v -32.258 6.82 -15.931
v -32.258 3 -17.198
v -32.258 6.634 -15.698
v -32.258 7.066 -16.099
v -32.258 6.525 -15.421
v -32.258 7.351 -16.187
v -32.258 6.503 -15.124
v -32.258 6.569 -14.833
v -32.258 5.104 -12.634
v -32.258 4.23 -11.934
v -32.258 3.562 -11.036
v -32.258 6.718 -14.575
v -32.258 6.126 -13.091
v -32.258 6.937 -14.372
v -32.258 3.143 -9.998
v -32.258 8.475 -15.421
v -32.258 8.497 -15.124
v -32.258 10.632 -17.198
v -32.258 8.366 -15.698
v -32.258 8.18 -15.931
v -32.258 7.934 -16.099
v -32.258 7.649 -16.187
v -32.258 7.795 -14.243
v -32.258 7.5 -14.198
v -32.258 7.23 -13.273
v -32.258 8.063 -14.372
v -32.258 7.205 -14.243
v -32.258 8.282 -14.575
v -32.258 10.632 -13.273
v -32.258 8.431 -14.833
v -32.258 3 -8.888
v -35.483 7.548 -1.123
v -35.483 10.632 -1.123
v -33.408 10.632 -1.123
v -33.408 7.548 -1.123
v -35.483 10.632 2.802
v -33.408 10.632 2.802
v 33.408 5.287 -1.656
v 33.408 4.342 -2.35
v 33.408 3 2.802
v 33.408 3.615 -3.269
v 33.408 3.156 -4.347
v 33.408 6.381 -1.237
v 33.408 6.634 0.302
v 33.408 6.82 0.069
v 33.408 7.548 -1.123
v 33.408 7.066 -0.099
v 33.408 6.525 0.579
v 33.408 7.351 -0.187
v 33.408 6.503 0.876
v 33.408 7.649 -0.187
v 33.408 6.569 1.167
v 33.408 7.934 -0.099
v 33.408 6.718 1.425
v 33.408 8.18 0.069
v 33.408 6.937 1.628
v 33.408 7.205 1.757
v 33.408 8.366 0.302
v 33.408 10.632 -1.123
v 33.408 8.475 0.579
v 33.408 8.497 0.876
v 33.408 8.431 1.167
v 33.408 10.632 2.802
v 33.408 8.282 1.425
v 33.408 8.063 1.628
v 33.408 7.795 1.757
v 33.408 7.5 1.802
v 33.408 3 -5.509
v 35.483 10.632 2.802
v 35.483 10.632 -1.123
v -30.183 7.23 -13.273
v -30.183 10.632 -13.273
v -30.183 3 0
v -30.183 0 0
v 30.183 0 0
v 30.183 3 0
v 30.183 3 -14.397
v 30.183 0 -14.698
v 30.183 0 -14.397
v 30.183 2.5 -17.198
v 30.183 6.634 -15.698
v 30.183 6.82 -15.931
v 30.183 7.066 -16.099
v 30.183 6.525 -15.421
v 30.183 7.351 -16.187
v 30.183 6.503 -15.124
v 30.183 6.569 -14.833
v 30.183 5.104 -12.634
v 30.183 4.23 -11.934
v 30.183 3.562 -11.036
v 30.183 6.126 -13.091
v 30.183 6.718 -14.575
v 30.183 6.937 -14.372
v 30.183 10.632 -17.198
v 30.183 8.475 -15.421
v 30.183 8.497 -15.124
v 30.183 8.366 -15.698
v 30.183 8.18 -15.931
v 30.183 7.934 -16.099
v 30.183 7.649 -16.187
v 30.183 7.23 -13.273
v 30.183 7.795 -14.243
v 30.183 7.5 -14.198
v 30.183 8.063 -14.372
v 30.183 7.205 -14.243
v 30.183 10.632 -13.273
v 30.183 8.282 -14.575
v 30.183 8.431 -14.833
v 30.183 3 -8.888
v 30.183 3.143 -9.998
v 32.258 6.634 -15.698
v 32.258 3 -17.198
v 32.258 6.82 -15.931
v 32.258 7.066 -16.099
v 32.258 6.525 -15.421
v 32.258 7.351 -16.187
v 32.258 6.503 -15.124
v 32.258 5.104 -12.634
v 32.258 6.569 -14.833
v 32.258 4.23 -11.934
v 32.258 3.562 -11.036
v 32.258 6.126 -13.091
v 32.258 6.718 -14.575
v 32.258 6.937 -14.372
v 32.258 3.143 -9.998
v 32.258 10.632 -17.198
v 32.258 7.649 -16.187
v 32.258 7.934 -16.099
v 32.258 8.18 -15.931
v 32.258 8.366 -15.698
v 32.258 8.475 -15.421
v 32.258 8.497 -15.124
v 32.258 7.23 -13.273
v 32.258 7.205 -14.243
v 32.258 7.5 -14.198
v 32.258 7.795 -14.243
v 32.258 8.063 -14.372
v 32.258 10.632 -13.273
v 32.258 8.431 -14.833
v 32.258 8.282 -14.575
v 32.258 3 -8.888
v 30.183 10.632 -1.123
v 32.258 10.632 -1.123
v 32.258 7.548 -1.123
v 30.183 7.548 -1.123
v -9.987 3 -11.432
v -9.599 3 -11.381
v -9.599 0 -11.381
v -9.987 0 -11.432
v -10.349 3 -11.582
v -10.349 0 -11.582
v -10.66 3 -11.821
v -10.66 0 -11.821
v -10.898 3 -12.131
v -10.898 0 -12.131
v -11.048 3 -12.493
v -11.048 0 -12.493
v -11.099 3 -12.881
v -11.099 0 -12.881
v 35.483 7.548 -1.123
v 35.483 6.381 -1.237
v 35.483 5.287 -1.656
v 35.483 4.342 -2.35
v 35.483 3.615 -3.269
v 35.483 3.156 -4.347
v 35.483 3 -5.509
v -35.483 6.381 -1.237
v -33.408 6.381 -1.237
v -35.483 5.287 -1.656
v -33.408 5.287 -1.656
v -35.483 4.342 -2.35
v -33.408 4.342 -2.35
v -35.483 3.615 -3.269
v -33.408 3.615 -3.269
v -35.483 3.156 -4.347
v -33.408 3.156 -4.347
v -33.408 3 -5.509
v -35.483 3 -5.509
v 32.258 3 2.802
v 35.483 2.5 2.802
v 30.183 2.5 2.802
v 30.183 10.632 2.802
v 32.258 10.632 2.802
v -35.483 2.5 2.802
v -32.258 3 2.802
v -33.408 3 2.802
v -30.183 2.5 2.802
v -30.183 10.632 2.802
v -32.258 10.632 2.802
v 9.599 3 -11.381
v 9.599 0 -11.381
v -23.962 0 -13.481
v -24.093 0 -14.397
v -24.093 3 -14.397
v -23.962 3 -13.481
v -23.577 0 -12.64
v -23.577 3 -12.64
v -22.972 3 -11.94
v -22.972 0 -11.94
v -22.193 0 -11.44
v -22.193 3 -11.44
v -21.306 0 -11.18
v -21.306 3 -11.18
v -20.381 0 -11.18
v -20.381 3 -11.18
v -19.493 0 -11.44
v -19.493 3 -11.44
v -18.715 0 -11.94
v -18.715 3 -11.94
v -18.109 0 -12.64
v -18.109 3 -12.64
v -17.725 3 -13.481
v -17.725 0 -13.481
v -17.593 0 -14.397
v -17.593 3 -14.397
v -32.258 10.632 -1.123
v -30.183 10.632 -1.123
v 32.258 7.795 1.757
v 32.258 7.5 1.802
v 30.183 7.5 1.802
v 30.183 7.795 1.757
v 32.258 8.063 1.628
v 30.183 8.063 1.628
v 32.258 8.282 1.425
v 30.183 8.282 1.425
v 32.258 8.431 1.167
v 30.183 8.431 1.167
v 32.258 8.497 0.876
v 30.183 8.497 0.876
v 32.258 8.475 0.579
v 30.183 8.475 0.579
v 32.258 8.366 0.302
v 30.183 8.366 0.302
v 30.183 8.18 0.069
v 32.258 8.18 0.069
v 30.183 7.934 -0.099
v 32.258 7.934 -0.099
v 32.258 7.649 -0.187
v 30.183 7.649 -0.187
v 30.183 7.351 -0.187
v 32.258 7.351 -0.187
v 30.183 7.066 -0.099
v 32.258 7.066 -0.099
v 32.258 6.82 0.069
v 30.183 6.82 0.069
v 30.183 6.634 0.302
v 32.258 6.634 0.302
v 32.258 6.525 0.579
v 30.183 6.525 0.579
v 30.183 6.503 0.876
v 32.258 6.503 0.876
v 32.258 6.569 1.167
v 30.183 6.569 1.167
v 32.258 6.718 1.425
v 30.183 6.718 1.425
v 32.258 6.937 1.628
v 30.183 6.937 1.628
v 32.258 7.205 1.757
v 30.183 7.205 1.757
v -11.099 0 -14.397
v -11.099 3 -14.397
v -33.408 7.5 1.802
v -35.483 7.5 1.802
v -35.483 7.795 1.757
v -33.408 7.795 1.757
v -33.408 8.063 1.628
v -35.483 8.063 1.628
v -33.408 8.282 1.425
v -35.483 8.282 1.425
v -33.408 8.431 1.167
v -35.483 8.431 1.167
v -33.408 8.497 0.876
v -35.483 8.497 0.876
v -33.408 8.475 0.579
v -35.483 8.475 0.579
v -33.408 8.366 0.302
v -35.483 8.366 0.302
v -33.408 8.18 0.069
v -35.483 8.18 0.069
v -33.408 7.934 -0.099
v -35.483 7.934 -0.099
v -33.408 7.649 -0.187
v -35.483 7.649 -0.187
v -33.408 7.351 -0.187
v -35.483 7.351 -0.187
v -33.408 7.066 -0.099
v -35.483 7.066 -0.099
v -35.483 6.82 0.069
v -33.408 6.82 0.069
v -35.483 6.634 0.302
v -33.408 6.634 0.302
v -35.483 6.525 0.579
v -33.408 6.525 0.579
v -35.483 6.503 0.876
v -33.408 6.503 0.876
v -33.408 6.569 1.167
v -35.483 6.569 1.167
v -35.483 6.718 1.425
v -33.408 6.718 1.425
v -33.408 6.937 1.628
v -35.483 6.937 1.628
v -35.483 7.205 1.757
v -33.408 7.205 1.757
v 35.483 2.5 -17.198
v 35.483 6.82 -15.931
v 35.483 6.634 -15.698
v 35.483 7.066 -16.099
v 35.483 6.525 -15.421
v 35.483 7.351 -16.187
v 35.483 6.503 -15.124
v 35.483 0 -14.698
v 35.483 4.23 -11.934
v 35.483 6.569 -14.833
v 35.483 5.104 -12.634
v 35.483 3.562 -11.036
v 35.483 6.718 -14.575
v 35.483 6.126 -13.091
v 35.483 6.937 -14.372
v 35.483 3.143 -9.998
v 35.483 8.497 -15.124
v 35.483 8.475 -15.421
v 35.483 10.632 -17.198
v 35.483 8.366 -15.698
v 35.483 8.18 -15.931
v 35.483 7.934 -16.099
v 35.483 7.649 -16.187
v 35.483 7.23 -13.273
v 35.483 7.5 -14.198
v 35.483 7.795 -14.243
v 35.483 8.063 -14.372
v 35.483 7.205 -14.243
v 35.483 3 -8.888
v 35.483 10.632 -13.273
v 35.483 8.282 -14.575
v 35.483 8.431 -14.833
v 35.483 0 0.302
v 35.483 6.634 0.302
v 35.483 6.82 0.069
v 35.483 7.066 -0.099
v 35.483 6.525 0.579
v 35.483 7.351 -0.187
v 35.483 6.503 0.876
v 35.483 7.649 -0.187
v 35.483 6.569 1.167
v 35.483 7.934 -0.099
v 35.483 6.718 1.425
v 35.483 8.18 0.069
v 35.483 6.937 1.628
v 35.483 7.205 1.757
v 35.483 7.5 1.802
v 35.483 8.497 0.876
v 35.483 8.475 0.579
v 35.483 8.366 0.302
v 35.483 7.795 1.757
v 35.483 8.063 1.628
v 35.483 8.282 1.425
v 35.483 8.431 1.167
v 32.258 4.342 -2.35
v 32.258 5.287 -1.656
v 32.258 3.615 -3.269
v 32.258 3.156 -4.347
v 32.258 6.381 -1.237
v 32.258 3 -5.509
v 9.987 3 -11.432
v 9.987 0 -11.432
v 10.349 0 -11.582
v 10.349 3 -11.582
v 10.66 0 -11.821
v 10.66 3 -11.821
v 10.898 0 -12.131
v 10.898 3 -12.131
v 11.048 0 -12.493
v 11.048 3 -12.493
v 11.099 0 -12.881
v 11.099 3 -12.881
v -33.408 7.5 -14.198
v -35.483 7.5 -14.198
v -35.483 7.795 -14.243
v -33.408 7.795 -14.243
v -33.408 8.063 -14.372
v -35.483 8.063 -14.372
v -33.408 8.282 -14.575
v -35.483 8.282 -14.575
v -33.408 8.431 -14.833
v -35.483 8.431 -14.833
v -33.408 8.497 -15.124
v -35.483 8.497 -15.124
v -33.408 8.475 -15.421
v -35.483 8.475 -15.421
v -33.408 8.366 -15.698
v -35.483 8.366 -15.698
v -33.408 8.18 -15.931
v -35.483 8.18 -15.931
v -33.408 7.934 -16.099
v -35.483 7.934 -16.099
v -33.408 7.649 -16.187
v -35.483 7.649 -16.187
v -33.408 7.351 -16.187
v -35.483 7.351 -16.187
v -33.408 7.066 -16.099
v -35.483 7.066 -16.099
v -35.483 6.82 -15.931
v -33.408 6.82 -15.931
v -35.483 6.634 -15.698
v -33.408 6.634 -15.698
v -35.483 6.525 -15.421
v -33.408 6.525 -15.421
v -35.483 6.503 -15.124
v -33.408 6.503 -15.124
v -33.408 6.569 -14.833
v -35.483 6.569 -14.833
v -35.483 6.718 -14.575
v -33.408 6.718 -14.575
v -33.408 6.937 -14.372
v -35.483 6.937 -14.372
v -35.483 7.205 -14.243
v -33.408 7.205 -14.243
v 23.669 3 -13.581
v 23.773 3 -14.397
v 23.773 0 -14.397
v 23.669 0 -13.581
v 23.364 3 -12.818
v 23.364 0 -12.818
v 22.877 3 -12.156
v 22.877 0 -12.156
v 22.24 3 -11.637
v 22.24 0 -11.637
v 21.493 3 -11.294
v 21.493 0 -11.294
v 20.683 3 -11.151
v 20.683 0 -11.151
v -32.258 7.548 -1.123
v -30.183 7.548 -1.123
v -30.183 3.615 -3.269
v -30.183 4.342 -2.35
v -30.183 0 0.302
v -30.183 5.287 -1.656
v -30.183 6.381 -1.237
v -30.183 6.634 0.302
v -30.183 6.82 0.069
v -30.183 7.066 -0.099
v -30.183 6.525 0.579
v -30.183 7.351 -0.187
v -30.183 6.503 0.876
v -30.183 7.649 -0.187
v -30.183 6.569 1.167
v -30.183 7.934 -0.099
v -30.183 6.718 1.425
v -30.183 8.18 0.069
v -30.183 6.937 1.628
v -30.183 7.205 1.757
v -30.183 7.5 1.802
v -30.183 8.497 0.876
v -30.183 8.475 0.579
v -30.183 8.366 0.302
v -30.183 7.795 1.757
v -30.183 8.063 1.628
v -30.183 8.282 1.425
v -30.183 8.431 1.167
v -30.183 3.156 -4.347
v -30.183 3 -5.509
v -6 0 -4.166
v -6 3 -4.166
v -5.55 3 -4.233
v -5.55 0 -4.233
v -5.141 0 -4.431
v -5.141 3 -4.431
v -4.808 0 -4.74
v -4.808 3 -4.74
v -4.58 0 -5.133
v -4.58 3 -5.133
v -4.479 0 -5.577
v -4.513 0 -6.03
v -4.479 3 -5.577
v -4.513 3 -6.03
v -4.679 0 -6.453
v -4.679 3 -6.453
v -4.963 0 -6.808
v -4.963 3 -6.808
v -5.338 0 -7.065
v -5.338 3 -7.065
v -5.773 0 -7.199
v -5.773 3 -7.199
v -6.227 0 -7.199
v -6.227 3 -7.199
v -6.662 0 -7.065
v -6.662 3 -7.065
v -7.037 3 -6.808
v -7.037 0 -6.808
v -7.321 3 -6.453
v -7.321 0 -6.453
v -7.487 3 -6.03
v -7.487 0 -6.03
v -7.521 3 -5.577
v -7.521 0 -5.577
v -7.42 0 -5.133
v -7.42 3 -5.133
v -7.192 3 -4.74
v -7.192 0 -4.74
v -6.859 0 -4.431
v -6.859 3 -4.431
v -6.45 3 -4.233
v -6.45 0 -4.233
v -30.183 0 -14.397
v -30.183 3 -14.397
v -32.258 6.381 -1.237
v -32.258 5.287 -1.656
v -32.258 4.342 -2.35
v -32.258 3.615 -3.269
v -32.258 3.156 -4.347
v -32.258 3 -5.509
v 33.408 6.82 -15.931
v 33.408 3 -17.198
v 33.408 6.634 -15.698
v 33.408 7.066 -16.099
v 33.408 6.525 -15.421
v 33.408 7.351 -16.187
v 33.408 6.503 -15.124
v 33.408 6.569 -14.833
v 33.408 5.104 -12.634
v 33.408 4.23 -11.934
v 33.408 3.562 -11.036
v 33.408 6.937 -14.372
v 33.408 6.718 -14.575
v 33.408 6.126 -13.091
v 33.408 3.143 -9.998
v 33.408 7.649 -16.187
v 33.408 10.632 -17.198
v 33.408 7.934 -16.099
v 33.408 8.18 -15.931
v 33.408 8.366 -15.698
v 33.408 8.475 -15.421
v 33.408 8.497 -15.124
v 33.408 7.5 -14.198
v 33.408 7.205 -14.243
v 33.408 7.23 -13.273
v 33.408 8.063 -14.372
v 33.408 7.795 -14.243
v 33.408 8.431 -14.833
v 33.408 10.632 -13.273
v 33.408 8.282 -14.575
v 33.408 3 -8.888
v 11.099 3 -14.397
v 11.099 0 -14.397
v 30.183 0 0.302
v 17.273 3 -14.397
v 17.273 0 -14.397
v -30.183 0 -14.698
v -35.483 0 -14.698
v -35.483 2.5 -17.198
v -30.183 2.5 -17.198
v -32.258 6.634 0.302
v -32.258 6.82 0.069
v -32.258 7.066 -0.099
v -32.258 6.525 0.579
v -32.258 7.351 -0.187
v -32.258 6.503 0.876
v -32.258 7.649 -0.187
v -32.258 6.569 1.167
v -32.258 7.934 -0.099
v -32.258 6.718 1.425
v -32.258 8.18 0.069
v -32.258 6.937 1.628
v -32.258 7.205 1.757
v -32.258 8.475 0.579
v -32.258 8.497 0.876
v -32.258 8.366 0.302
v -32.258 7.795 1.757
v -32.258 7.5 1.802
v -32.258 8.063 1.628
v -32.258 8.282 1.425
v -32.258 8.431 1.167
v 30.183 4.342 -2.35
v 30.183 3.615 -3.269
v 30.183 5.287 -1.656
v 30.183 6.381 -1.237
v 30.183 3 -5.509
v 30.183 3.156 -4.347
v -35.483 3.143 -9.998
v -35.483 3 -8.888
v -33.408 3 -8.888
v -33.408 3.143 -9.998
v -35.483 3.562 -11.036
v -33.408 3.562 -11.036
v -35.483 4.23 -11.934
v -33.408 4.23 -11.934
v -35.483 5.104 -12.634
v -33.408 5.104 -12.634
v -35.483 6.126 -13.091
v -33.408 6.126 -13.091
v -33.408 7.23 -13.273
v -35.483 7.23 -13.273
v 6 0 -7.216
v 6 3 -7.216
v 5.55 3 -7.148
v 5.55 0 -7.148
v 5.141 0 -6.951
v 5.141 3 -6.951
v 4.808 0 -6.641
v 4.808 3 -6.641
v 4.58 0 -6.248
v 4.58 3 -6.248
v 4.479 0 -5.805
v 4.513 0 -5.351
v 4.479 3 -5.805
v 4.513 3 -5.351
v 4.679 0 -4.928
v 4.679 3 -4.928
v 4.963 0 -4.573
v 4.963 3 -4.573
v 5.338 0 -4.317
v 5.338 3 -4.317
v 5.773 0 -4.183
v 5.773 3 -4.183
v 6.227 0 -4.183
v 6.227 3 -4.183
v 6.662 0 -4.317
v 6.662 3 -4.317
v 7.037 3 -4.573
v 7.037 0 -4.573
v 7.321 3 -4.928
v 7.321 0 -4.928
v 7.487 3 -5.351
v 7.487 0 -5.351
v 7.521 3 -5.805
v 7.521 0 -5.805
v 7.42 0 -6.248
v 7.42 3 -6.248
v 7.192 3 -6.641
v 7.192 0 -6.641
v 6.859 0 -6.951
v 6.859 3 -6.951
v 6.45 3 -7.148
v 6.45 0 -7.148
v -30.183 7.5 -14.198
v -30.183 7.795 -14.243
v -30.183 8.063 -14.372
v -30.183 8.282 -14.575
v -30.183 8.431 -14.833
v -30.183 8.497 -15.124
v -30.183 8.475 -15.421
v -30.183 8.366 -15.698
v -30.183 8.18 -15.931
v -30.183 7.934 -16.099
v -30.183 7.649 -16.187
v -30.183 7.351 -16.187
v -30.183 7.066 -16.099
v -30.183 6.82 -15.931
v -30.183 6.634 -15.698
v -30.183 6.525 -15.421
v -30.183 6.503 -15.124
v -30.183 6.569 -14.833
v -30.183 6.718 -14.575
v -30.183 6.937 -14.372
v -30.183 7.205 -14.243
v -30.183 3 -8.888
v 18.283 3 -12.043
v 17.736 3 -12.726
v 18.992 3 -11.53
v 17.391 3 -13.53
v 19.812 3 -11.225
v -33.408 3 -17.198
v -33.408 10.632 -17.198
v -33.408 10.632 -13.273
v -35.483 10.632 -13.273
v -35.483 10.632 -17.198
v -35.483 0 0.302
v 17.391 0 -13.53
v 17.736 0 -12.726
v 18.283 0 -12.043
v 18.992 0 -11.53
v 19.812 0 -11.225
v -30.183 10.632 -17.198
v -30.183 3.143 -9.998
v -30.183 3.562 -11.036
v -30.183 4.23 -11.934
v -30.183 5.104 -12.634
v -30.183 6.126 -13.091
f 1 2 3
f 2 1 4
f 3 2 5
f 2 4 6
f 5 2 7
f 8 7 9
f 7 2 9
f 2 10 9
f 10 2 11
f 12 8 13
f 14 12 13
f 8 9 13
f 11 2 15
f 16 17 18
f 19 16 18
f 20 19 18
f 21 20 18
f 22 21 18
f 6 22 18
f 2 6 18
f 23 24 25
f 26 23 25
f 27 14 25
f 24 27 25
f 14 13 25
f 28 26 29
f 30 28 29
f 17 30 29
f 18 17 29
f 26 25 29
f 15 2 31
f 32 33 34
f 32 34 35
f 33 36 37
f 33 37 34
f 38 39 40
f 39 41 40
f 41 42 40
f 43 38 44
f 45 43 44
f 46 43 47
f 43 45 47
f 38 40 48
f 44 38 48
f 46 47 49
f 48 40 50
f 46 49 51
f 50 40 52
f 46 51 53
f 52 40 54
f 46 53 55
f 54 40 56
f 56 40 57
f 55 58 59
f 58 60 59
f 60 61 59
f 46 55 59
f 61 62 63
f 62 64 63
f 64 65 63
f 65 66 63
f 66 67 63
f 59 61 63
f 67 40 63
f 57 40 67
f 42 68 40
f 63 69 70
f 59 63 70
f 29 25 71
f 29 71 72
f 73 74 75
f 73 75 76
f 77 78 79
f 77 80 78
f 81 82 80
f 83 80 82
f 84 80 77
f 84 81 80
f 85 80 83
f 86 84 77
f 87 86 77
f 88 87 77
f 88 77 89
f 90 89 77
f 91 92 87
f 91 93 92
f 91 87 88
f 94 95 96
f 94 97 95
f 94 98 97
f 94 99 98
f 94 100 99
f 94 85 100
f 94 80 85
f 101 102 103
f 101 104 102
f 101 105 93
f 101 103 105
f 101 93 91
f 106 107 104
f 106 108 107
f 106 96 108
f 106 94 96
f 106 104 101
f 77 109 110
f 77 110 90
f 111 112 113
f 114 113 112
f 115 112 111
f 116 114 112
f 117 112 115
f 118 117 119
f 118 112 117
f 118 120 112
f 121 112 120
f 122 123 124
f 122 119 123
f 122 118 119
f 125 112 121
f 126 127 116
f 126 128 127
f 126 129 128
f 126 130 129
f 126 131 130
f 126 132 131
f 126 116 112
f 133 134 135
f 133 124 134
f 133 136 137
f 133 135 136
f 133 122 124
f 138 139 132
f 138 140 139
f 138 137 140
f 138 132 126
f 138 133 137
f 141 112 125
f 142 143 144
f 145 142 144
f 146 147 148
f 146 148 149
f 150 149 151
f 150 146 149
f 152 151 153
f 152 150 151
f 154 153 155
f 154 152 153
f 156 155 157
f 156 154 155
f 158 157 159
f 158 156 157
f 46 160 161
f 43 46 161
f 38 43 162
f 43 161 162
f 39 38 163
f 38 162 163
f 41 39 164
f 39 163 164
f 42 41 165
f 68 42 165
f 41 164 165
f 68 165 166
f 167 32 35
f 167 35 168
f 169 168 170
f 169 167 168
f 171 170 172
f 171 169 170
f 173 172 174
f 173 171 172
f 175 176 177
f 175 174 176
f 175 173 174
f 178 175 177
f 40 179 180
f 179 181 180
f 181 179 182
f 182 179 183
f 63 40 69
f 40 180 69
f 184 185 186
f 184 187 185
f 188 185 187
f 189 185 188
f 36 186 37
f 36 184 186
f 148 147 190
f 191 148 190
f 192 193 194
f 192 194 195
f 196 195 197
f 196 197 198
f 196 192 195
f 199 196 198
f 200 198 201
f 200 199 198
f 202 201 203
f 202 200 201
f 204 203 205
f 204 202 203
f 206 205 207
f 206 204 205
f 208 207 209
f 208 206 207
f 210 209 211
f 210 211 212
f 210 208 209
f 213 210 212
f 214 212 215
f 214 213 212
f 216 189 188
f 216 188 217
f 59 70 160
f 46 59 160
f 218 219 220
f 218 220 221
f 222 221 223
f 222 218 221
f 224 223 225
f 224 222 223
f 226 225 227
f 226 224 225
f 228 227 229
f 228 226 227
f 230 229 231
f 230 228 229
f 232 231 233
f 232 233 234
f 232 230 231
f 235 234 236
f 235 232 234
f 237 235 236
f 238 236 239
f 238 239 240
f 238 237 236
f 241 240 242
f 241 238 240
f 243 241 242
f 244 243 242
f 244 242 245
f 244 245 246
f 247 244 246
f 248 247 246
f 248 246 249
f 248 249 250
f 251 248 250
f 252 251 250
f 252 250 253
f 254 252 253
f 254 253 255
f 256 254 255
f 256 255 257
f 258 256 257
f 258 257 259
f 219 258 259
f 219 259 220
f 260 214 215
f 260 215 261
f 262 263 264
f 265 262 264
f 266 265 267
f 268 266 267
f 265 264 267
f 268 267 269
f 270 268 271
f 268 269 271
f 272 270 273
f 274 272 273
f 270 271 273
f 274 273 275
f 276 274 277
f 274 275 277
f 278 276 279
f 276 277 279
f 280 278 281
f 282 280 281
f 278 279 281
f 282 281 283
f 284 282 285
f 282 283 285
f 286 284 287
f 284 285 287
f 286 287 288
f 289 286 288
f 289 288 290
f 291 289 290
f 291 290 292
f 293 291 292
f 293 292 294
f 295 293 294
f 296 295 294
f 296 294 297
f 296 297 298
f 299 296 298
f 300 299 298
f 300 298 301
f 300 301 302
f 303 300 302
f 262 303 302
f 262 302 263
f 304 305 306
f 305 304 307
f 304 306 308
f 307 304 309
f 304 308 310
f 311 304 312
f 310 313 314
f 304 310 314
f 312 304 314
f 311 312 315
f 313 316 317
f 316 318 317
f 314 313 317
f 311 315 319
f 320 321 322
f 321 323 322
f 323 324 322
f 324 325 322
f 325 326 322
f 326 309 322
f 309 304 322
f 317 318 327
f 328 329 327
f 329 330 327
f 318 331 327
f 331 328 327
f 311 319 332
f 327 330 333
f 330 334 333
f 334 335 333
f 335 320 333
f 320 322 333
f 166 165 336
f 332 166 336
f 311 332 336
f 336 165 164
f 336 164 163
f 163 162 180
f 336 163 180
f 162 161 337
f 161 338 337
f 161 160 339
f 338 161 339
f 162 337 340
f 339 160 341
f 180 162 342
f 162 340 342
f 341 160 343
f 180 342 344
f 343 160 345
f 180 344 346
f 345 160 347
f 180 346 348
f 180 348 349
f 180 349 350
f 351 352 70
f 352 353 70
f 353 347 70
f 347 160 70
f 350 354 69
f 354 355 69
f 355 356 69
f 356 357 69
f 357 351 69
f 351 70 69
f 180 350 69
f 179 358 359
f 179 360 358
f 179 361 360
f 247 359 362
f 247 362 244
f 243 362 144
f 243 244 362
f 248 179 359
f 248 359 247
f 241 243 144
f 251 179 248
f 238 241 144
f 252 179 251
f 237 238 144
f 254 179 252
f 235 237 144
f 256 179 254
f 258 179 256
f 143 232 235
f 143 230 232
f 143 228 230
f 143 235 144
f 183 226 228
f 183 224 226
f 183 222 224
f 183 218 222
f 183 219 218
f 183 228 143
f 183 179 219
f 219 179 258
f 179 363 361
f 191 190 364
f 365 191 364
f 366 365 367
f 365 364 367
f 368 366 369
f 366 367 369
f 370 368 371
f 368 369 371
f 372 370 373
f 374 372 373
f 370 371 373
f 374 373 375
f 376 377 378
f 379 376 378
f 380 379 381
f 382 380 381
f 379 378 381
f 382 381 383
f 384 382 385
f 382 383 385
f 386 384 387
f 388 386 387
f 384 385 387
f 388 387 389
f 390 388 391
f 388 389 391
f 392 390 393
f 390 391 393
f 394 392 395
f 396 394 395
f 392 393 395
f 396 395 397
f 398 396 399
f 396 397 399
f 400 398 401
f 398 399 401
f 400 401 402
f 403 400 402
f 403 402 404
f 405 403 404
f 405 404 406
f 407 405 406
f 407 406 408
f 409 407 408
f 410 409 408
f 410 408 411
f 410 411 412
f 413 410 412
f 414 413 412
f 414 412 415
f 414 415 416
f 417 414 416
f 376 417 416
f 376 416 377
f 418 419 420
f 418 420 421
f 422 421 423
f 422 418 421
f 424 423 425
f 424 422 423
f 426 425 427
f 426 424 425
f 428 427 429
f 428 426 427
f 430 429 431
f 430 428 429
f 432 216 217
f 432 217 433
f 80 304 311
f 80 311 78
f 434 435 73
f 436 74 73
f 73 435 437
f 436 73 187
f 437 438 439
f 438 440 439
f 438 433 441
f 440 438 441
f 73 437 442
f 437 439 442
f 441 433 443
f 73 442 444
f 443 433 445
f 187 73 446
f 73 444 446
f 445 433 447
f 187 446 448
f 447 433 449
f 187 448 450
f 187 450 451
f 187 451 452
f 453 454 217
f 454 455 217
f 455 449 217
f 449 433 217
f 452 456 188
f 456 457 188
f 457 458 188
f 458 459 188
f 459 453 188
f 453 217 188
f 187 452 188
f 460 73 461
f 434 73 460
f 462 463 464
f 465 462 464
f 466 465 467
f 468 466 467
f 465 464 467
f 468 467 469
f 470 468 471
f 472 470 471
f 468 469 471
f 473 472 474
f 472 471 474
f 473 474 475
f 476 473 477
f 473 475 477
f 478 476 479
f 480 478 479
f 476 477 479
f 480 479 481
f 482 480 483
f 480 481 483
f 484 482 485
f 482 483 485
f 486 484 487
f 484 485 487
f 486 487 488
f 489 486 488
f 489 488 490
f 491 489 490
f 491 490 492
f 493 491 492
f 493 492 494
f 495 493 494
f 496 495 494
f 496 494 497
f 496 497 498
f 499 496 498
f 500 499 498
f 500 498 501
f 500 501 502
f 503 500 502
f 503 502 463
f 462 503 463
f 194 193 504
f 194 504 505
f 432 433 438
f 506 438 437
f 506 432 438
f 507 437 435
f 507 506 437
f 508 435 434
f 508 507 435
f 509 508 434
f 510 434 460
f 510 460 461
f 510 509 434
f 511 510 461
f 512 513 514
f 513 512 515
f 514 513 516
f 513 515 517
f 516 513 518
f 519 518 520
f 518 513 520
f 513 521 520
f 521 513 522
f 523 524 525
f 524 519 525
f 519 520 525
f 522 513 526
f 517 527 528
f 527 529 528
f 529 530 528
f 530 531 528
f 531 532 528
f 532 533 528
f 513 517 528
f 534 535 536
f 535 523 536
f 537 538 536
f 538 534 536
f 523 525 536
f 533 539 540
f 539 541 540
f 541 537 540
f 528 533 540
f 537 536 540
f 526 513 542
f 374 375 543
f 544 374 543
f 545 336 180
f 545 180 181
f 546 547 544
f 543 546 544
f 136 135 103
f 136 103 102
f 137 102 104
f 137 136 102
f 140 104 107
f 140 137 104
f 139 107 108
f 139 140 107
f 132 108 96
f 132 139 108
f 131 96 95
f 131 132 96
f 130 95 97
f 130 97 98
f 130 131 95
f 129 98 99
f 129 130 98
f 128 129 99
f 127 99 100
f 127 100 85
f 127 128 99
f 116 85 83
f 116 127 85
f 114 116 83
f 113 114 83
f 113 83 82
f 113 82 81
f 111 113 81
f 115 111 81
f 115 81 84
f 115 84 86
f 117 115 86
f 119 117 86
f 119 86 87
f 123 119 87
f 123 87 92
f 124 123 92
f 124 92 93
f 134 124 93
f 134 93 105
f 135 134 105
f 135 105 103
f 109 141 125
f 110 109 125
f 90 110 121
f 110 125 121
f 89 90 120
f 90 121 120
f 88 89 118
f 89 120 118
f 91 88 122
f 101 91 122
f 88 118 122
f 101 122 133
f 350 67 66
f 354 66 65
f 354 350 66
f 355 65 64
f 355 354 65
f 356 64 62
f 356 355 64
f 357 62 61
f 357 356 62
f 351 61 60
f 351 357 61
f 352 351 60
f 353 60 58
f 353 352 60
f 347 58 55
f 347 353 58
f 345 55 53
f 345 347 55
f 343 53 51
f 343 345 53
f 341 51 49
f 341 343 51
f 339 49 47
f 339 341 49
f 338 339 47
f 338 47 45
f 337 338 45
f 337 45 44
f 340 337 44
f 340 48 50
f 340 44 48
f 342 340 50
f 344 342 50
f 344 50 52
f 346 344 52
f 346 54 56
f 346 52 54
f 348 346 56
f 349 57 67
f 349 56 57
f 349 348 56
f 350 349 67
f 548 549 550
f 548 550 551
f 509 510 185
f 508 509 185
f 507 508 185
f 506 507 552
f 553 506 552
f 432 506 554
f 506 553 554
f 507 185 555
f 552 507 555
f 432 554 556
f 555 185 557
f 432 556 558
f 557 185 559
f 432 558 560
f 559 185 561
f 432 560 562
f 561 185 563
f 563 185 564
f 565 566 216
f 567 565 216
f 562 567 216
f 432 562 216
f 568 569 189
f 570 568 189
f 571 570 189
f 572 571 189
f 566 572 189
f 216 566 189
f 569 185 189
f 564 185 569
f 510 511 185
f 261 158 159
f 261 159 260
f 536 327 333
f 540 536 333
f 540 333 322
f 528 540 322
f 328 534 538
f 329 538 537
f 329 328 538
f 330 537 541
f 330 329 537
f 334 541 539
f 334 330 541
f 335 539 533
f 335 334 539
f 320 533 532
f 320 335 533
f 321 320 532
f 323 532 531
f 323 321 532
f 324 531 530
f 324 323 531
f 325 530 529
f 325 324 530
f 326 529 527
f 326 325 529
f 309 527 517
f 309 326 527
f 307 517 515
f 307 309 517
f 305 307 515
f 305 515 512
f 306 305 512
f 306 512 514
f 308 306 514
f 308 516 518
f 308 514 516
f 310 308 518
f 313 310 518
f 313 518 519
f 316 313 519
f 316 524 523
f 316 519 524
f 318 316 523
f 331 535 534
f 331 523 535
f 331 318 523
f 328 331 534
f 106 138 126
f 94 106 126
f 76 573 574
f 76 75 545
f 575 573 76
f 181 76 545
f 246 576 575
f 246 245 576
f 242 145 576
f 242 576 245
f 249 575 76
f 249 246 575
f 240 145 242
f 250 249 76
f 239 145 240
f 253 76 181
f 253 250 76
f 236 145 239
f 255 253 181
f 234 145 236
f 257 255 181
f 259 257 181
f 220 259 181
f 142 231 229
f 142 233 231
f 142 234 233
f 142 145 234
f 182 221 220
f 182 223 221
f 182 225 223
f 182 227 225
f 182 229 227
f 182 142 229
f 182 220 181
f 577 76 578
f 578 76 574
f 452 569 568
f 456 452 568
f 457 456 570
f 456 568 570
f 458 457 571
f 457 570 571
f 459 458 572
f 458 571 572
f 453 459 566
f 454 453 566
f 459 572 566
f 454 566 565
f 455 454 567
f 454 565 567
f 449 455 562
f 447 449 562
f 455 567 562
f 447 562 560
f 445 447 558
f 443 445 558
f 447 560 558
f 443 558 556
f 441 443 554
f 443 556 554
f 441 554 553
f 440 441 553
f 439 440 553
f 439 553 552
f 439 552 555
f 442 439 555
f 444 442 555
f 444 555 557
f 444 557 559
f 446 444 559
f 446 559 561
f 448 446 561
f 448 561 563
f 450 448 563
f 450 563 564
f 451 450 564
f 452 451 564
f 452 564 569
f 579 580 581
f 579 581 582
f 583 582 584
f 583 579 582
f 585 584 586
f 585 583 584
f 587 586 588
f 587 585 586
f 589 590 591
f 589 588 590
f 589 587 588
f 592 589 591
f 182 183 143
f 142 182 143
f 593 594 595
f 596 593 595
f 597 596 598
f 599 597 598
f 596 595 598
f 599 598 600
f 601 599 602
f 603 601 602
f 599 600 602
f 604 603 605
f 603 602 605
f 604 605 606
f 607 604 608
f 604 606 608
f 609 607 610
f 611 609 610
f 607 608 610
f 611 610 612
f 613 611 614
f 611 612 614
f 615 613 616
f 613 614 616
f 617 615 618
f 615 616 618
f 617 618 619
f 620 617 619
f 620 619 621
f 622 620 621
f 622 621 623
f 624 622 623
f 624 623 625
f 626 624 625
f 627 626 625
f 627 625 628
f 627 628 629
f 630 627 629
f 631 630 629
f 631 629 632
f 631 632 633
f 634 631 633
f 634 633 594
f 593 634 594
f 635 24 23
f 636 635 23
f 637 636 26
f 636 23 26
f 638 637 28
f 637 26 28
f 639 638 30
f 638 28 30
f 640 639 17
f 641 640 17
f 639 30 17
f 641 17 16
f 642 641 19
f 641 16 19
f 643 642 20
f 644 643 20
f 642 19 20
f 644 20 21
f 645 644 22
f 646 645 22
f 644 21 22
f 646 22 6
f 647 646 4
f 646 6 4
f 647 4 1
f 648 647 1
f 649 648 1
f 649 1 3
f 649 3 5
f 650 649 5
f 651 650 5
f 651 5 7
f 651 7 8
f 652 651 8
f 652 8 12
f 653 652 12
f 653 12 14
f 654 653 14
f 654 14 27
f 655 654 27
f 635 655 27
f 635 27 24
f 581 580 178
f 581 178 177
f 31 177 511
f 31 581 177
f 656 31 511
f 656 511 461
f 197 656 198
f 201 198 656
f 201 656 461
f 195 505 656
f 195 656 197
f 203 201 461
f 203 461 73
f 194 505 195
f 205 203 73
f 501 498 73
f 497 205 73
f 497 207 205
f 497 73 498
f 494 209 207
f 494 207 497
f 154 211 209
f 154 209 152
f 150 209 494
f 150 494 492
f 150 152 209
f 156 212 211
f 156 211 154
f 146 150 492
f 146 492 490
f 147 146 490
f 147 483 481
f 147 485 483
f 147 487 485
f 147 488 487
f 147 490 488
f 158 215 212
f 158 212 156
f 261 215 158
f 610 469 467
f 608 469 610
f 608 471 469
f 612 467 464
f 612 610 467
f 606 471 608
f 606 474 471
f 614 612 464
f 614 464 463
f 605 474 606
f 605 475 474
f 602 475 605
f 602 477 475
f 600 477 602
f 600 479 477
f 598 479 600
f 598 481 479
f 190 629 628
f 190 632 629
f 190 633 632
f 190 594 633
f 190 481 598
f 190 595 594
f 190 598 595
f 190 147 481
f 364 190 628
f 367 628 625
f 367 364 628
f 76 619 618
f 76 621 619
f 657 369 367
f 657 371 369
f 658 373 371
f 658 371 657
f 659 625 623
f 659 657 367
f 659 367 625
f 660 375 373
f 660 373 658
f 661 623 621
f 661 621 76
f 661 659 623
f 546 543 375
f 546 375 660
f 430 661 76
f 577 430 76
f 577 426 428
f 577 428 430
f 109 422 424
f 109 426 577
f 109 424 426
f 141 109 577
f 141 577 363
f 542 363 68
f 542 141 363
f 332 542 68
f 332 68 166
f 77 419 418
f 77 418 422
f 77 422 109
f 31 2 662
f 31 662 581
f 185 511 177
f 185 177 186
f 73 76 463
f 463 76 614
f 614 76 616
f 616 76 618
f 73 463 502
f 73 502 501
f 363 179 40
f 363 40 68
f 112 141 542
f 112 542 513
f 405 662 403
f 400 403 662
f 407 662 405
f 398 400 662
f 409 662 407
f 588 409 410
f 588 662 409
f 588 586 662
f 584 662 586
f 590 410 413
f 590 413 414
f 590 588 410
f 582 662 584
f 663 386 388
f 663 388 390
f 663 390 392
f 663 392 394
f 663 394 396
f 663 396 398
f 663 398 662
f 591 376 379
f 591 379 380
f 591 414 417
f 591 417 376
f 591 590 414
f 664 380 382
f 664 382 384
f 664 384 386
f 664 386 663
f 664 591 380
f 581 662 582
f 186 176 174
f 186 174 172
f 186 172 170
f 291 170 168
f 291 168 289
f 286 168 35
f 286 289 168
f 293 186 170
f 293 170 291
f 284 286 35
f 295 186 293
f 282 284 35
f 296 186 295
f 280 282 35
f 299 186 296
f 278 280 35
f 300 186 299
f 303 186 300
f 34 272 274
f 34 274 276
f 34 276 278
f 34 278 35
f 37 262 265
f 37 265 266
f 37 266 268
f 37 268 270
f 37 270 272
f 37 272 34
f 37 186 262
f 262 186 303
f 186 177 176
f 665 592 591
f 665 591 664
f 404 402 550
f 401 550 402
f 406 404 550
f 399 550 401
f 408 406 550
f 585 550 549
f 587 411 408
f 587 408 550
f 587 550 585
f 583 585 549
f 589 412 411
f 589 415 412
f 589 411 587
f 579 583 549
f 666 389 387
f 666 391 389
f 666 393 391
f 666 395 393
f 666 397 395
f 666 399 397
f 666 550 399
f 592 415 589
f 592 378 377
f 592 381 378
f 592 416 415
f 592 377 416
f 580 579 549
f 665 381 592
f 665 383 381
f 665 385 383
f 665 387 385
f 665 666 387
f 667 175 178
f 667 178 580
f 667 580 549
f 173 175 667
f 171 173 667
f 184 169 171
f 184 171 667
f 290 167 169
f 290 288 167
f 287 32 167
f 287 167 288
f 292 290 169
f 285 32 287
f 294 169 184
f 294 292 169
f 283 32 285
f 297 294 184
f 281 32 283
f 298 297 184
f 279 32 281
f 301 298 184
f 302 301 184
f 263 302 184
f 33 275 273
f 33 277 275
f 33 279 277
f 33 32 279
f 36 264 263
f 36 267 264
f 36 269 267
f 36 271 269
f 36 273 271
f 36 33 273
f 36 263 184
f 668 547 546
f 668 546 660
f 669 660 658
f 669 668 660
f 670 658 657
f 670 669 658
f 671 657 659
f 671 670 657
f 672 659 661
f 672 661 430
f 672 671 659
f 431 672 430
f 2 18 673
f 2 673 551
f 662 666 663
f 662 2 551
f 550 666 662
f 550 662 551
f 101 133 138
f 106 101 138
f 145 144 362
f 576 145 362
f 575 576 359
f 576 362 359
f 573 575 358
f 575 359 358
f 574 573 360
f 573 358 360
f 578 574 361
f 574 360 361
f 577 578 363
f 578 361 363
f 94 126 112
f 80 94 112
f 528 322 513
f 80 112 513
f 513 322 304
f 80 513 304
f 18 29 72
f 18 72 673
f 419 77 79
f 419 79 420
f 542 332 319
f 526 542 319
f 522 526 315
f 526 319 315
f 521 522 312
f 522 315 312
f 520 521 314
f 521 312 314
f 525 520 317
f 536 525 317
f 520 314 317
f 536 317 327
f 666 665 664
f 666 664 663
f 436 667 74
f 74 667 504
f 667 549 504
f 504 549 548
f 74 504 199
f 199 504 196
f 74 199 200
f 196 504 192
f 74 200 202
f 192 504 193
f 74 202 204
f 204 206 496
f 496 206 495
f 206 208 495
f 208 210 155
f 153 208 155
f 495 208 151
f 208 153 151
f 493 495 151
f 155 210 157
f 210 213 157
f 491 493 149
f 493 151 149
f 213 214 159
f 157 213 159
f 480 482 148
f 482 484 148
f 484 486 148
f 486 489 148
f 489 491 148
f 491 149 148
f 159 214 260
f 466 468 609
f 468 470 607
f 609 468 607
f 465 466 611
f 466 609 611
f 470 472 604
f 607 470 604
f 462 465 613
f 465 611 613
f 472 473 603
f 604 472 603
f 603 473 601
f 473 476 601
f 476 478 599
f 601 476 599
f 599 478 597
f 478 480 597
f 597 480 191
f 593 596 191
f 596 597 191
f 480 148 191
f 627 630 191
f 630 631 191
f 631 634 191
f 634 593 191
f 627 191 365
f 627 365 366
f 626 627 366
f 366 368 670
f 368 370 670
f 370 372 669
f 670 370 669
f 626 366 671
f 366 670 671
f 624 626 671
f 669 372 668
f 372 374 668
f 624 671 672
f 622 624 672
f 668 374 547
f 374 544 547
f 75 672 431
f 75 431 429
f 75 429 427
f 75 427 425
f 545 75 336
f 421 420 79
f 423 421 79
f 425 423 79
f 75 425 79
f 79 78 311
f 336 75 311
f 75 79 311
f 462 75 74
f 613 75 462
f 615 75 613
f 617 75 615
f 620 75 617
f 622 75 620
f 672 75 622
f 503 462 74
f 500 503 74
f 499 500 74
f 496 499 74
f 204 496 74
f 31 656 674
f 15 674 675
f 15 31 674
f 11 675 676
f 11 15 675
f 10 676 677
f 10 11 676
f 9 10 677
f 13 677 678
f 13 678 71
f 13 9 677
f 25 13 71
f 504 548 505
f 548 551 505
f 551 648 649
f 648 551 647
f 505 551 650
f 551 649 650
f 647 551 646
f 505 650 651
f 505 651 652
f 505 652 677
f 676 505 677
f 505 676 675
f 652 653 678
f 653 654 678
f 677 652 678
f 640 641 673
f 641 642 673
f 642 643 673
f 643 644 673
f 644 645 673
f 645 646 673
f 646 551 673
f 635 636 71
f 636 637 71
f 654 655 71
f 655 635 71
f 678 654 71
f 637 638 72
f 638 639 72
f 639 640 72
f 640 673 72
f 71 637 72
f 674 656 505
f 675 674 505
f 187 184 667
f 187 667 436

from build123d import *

# Parameters (mm, degrees)
BOSS_EXTRUDE1_DEPTH      = 3
SKETCH2_W                = 14.396583112
SKETCH2_H                = 3
BOSS_EXTRUDE2_DEPTH      = 8.6
SKETCH3_R                = 1
BOSS_EXTRUDE3_DEPTH      = 5.3
SKETCH4_W                = 1.15
SKETCH4_H                = 7.632118098
CUT_EXTRUDE1_DEPTH       = 26.3
CHAMFER1_SIZE            = 2.5
CUT_EXTRUDE2_DEPTH       = 10
CHAMFER1_OF_MIRROR1_SIZE = 2.5
CUT_EXTRUDE5_START       = -10
CUT_EXTRUDE5_DEPTH       = 10
BOSS_EXTRUDE4_DEPTH      = 3
SKETCH7_R                = 1.525
CUT_EXTRUDE6_DEPTH       = 41.163420863


with BuildPart() as part:
    # Sketch1 → Boss-Extrude1 (new body)
    with BuildSketch(Plane(origin=(0, 0, 0), x_dir=(1, 0, 0), z_dir=(0, 1, 0))):
        with BuildLine():
            Line((-26.88337521, 0), (-26.88337521, 14.396583112))
            Line((-26.88337521, 14.396583112), (-24.09337521, 14.396583112))
            ThreePointArc((-24.09337521, 14.396583112), (-20.84337521, 11.146583112), (-17.59337521, 14.396583112))
            Line((-17.59337521, 14.396583112), (0, 14.396583112))
            Line((0, 14.396583112), (0, 0))
            Line((0, 0), (-26.88337521, 0))
        make_face()
    boss_extrude1 = extrude(amount=BOSS_EXTRUDE1_DEPTH)

    # Sketch2 → Boss-Extrude2 (add)
    with BuildSketch(Plane.ZY.offset(26.88337521)):
        with Locations((-7.198291556, 1.5)):
            Rectangle(SKETCH2_W, SKETCH2_H)
    boss_extrude2 = extrude(amount=BOSS_EXTRUDE2_DEPTH)

    # Sketch3 → Boss-Extrude3 (add)
    with BuildSketch(Plane.ZY.offset(35.48337521)):
        with BuildLine():
            Line((1.532781983, 10.632118098), (-1.123291556, 10.632118098))
            Line((-1.123291556, 10.632118098), (-1.123291556, 10.557118098))
            Line((-1.123291556, 10.557118098), (-1.123291556, 7.547815402))
            ThreePointArc((-1.123291556, 7.547815402), (-2.349871735, 4.342215517), (-5.508799885, 3))
            Line((-5.508799885, 3), (-8.887750376, 3))
            ThreePointArc((-8.887750376, 3), (-11.934395079, 4.229921298), (-13.273291556, 7.230272374))
            Line((-13.273291556, 7.230272374), (-13.273291556, 10.557118098))
            Line((-13.273291556, 10.557118098), (-13.273291556, 10.632118098))
            Line((-13.273291556, 10.632118098), (-15.929365096, 10.632118098))
            Line((-15.929365096, 10.632118098), (-17.198291556, 10.632118098))
            Line((-17.198291556, 10.632118098), (-17.198291556, 7.5))
            Line((-17.198291556, 7.5), (-17.198291556, 0))
            Line((-17.198291556, 0), (-14.396583112, 0))
            Line((-14.396583112, 0), (0, 0))
            Line((0, 0), (2.801708444, 0))
            Line((2.801708444, 0), (2.801708444, 7.5))
            Line((2.801708444, 7.5), (2.801708444, 10.632118098))
            Line((2.801708444, 10.632118098), (1.532781983, 10.632118098))
        make_face()
        with Locations((-15.198291556, 7.5)):
            Circle(SKETCH3_R, mode=Mode.SUBTRACT)
        with Locations((0.801708444, 7.5)):
            Circle(SKETCH3_R, mode=Mode.SUBTRACT)
    boss_extrude3 = extrude(amount=-BOSS_EXTRUDE3_DEPTH)

    # Sketch4 → Cut-Extrude1 (cut)
    with BuildSketch(Plane.XY.offset(2.801708444)):
        with Locations((-32.83337521, 6.816059049)):
            Rectangle(SKETCH4_W, SKETCH4_H)
    cut_extrude1 = extrude(amount=-CUT_EXTRUDE1_DEPTH, mode=Mode.SUBTRACT)

    # Chamfer1
    chamfer1_edges = [part.edges().sort_by_distance(p)[0] for p in [
        (-32.83337521, 0, -17.198291556),
        (-32.83337521, 0, 2.801708444),
    ]]
    chamfer(chamfer1_edges, length=CHAMFER1_SIZE)

    # Sketch5 → Cut-Extrude2 (cut)
    with BuildSketch(Plane(origin=(0, 3, 0), x_dir=(1, 0, 0), z_dir=(0, 1, 0))):
        with BuildLine():
            Line((0, 11.381166784), (-9.598972409, 11.381166784))
            ThreePointArc((-9.598972409, 11.381166784), (-10.65963258, 11.820506612), (-11.098972409, 12.881166784))
            Line((-11.098972409, 12.881166784), (-11.098972409, 14.396583112))
            Line((-11.098972409, 14.396583112), (0, 14.396583112))
            Line((0, 14.396583112), (0, 11.381166784))
        make_face()
    cut_extrude2 = extrude(amount=-CUT_EXTRUDE2_DEPTH, mode=Mode.SUBTRACT)

    # Mirror1: Boss-Extrude1, Boss-Extrude2, Boss-Extrude3, Cut-Extrude1, Cut-Extrude2 across plane
    add(boss_extrude1.mirror(Plane(origin=(0, 0, 0), x_dir=(0, 0, 1), z_dir=(1, 0, 0))))
    add(boss_extrude2.mirror(Plane(origin=(0, 0, 0), x_dir=(0, 0, 1), z_dir=(1, 0, 0))))
    add(boss_extrude3.mirror(Plane(origin=(0, 0, 0), x_dir=(0, 0, 1), z_dir=(1, 0, 0))))
    add(cut_extrude1.mirror(Plane(origin=(0, 0, 0), x_dir=(0, 0, 1), z_dir=(1, 0, 0))), mode=Mode.SUBTRACT)
    add(cut_extrude2.mirror(Plane(origin=(0, 0, 0), x_dir=(0, 0, 1), z_dir=(1, 0, 0))), mode=Mode.SUBTRACT)

    # Chamfer1 of Mirror1
    chamfer1_of_mirror1_edges = [part.edges().sort_by_distance(p)[0] for p in [
        (32.83337521, 0, -17.198291556),
        (32.83337521, 0, 2.801708444),
    ]]
    chamfer(chamfer1_of_mirror1_edges, length=CHAMFER1_OF_MIRROR1_SIZE)

    # Sketch6 → Cut-Extrude5 (cut)
    with BuildSketch(Plane(origin=(0, 3, 0), x_dir=(1, 0, 0), z_dir=(0, 1, 0)).offset(CUT_EXTRUDE5_START)):
        with BuildLine():
            ThreePointArc((20.68337521, 11.150523963), (22.877361191, 12.155768528), (23.77337521, 14.396583112))
            ThreePointArc((23.77337521, 14.396583112), (20.52337521, 17.646583112), (17.27337521, 14.396583112))
            Line((17.27337521, 14.396583112), (17.59337521, 14.396583112))
            ThreePointArc((17.59337521, 14.396583112), (18.489389228, 12.155768528), (20.68337521, 11.150523963))
        make_face()
        with BuildLine():
            Line((17.59337521, 14.396583112), (17.27337521, 14.396583112))
            ThreePointArc((17.27337521, 14.396583112), (18.282560626, 12.042597131), (20.68337521, 11.150523963))
            ThreePointArc((20.68337521, 11.150523963), (18.489389228, 12.155768528), (17.59337521, 14.396583112))
        make_face()
    extrude(amount=CUT_EXTRUDE5_DEPTH, mode=Mode.SUBTRACT)

    # Sketch6<3> → Boss-Extrude4 (add, through all)
    with BuildSketch(Plane(origin=(0, 3, 0), x_dir=(1, 0, 0), z_dir=(0, 1, 0))):
        with BuildLine():
            Line((24.09337521, 14.396583112), (23.77337521, 14.396583112))
            ThreePointArc((23.77337521, 14.396583112), (22.877361191, 12.155768528), (20.68337521, 11.150523963))
            ThreePointArc((20.68337521, 11.150523963), (20.763350947, 11.147568474), (20.84337521, 11.146583112))
            ThreePointArc((20.84337521, 11.146583112), (23.141472249, 12.098486073), (24.09337521, 14.396583112))
        make_face()
    extrude(amount=-BOSS_EXTRUDE4_DEPTH)

    # Sketch7 → Cut-Extrude6 (cut, through all)
    with BuildSketch(Plane(origin=(0, 3, 0), x_dir=(1, 0, 0), z_dir=(0, 1, 0))):
        with Locations(Location((-6, 5.690583392, 0), (0, 0, 270))):
            Circle(SKETCH7_R)
        with Locations(Location((6, 5.690583392, 0), (0, 0, 90))):
            Circle(SKETCH7_R)
    extrude(amount=-CUT_EXTRUDE6_DEPTH, mode=Mode.SUBTRACT)


solid = part.part
